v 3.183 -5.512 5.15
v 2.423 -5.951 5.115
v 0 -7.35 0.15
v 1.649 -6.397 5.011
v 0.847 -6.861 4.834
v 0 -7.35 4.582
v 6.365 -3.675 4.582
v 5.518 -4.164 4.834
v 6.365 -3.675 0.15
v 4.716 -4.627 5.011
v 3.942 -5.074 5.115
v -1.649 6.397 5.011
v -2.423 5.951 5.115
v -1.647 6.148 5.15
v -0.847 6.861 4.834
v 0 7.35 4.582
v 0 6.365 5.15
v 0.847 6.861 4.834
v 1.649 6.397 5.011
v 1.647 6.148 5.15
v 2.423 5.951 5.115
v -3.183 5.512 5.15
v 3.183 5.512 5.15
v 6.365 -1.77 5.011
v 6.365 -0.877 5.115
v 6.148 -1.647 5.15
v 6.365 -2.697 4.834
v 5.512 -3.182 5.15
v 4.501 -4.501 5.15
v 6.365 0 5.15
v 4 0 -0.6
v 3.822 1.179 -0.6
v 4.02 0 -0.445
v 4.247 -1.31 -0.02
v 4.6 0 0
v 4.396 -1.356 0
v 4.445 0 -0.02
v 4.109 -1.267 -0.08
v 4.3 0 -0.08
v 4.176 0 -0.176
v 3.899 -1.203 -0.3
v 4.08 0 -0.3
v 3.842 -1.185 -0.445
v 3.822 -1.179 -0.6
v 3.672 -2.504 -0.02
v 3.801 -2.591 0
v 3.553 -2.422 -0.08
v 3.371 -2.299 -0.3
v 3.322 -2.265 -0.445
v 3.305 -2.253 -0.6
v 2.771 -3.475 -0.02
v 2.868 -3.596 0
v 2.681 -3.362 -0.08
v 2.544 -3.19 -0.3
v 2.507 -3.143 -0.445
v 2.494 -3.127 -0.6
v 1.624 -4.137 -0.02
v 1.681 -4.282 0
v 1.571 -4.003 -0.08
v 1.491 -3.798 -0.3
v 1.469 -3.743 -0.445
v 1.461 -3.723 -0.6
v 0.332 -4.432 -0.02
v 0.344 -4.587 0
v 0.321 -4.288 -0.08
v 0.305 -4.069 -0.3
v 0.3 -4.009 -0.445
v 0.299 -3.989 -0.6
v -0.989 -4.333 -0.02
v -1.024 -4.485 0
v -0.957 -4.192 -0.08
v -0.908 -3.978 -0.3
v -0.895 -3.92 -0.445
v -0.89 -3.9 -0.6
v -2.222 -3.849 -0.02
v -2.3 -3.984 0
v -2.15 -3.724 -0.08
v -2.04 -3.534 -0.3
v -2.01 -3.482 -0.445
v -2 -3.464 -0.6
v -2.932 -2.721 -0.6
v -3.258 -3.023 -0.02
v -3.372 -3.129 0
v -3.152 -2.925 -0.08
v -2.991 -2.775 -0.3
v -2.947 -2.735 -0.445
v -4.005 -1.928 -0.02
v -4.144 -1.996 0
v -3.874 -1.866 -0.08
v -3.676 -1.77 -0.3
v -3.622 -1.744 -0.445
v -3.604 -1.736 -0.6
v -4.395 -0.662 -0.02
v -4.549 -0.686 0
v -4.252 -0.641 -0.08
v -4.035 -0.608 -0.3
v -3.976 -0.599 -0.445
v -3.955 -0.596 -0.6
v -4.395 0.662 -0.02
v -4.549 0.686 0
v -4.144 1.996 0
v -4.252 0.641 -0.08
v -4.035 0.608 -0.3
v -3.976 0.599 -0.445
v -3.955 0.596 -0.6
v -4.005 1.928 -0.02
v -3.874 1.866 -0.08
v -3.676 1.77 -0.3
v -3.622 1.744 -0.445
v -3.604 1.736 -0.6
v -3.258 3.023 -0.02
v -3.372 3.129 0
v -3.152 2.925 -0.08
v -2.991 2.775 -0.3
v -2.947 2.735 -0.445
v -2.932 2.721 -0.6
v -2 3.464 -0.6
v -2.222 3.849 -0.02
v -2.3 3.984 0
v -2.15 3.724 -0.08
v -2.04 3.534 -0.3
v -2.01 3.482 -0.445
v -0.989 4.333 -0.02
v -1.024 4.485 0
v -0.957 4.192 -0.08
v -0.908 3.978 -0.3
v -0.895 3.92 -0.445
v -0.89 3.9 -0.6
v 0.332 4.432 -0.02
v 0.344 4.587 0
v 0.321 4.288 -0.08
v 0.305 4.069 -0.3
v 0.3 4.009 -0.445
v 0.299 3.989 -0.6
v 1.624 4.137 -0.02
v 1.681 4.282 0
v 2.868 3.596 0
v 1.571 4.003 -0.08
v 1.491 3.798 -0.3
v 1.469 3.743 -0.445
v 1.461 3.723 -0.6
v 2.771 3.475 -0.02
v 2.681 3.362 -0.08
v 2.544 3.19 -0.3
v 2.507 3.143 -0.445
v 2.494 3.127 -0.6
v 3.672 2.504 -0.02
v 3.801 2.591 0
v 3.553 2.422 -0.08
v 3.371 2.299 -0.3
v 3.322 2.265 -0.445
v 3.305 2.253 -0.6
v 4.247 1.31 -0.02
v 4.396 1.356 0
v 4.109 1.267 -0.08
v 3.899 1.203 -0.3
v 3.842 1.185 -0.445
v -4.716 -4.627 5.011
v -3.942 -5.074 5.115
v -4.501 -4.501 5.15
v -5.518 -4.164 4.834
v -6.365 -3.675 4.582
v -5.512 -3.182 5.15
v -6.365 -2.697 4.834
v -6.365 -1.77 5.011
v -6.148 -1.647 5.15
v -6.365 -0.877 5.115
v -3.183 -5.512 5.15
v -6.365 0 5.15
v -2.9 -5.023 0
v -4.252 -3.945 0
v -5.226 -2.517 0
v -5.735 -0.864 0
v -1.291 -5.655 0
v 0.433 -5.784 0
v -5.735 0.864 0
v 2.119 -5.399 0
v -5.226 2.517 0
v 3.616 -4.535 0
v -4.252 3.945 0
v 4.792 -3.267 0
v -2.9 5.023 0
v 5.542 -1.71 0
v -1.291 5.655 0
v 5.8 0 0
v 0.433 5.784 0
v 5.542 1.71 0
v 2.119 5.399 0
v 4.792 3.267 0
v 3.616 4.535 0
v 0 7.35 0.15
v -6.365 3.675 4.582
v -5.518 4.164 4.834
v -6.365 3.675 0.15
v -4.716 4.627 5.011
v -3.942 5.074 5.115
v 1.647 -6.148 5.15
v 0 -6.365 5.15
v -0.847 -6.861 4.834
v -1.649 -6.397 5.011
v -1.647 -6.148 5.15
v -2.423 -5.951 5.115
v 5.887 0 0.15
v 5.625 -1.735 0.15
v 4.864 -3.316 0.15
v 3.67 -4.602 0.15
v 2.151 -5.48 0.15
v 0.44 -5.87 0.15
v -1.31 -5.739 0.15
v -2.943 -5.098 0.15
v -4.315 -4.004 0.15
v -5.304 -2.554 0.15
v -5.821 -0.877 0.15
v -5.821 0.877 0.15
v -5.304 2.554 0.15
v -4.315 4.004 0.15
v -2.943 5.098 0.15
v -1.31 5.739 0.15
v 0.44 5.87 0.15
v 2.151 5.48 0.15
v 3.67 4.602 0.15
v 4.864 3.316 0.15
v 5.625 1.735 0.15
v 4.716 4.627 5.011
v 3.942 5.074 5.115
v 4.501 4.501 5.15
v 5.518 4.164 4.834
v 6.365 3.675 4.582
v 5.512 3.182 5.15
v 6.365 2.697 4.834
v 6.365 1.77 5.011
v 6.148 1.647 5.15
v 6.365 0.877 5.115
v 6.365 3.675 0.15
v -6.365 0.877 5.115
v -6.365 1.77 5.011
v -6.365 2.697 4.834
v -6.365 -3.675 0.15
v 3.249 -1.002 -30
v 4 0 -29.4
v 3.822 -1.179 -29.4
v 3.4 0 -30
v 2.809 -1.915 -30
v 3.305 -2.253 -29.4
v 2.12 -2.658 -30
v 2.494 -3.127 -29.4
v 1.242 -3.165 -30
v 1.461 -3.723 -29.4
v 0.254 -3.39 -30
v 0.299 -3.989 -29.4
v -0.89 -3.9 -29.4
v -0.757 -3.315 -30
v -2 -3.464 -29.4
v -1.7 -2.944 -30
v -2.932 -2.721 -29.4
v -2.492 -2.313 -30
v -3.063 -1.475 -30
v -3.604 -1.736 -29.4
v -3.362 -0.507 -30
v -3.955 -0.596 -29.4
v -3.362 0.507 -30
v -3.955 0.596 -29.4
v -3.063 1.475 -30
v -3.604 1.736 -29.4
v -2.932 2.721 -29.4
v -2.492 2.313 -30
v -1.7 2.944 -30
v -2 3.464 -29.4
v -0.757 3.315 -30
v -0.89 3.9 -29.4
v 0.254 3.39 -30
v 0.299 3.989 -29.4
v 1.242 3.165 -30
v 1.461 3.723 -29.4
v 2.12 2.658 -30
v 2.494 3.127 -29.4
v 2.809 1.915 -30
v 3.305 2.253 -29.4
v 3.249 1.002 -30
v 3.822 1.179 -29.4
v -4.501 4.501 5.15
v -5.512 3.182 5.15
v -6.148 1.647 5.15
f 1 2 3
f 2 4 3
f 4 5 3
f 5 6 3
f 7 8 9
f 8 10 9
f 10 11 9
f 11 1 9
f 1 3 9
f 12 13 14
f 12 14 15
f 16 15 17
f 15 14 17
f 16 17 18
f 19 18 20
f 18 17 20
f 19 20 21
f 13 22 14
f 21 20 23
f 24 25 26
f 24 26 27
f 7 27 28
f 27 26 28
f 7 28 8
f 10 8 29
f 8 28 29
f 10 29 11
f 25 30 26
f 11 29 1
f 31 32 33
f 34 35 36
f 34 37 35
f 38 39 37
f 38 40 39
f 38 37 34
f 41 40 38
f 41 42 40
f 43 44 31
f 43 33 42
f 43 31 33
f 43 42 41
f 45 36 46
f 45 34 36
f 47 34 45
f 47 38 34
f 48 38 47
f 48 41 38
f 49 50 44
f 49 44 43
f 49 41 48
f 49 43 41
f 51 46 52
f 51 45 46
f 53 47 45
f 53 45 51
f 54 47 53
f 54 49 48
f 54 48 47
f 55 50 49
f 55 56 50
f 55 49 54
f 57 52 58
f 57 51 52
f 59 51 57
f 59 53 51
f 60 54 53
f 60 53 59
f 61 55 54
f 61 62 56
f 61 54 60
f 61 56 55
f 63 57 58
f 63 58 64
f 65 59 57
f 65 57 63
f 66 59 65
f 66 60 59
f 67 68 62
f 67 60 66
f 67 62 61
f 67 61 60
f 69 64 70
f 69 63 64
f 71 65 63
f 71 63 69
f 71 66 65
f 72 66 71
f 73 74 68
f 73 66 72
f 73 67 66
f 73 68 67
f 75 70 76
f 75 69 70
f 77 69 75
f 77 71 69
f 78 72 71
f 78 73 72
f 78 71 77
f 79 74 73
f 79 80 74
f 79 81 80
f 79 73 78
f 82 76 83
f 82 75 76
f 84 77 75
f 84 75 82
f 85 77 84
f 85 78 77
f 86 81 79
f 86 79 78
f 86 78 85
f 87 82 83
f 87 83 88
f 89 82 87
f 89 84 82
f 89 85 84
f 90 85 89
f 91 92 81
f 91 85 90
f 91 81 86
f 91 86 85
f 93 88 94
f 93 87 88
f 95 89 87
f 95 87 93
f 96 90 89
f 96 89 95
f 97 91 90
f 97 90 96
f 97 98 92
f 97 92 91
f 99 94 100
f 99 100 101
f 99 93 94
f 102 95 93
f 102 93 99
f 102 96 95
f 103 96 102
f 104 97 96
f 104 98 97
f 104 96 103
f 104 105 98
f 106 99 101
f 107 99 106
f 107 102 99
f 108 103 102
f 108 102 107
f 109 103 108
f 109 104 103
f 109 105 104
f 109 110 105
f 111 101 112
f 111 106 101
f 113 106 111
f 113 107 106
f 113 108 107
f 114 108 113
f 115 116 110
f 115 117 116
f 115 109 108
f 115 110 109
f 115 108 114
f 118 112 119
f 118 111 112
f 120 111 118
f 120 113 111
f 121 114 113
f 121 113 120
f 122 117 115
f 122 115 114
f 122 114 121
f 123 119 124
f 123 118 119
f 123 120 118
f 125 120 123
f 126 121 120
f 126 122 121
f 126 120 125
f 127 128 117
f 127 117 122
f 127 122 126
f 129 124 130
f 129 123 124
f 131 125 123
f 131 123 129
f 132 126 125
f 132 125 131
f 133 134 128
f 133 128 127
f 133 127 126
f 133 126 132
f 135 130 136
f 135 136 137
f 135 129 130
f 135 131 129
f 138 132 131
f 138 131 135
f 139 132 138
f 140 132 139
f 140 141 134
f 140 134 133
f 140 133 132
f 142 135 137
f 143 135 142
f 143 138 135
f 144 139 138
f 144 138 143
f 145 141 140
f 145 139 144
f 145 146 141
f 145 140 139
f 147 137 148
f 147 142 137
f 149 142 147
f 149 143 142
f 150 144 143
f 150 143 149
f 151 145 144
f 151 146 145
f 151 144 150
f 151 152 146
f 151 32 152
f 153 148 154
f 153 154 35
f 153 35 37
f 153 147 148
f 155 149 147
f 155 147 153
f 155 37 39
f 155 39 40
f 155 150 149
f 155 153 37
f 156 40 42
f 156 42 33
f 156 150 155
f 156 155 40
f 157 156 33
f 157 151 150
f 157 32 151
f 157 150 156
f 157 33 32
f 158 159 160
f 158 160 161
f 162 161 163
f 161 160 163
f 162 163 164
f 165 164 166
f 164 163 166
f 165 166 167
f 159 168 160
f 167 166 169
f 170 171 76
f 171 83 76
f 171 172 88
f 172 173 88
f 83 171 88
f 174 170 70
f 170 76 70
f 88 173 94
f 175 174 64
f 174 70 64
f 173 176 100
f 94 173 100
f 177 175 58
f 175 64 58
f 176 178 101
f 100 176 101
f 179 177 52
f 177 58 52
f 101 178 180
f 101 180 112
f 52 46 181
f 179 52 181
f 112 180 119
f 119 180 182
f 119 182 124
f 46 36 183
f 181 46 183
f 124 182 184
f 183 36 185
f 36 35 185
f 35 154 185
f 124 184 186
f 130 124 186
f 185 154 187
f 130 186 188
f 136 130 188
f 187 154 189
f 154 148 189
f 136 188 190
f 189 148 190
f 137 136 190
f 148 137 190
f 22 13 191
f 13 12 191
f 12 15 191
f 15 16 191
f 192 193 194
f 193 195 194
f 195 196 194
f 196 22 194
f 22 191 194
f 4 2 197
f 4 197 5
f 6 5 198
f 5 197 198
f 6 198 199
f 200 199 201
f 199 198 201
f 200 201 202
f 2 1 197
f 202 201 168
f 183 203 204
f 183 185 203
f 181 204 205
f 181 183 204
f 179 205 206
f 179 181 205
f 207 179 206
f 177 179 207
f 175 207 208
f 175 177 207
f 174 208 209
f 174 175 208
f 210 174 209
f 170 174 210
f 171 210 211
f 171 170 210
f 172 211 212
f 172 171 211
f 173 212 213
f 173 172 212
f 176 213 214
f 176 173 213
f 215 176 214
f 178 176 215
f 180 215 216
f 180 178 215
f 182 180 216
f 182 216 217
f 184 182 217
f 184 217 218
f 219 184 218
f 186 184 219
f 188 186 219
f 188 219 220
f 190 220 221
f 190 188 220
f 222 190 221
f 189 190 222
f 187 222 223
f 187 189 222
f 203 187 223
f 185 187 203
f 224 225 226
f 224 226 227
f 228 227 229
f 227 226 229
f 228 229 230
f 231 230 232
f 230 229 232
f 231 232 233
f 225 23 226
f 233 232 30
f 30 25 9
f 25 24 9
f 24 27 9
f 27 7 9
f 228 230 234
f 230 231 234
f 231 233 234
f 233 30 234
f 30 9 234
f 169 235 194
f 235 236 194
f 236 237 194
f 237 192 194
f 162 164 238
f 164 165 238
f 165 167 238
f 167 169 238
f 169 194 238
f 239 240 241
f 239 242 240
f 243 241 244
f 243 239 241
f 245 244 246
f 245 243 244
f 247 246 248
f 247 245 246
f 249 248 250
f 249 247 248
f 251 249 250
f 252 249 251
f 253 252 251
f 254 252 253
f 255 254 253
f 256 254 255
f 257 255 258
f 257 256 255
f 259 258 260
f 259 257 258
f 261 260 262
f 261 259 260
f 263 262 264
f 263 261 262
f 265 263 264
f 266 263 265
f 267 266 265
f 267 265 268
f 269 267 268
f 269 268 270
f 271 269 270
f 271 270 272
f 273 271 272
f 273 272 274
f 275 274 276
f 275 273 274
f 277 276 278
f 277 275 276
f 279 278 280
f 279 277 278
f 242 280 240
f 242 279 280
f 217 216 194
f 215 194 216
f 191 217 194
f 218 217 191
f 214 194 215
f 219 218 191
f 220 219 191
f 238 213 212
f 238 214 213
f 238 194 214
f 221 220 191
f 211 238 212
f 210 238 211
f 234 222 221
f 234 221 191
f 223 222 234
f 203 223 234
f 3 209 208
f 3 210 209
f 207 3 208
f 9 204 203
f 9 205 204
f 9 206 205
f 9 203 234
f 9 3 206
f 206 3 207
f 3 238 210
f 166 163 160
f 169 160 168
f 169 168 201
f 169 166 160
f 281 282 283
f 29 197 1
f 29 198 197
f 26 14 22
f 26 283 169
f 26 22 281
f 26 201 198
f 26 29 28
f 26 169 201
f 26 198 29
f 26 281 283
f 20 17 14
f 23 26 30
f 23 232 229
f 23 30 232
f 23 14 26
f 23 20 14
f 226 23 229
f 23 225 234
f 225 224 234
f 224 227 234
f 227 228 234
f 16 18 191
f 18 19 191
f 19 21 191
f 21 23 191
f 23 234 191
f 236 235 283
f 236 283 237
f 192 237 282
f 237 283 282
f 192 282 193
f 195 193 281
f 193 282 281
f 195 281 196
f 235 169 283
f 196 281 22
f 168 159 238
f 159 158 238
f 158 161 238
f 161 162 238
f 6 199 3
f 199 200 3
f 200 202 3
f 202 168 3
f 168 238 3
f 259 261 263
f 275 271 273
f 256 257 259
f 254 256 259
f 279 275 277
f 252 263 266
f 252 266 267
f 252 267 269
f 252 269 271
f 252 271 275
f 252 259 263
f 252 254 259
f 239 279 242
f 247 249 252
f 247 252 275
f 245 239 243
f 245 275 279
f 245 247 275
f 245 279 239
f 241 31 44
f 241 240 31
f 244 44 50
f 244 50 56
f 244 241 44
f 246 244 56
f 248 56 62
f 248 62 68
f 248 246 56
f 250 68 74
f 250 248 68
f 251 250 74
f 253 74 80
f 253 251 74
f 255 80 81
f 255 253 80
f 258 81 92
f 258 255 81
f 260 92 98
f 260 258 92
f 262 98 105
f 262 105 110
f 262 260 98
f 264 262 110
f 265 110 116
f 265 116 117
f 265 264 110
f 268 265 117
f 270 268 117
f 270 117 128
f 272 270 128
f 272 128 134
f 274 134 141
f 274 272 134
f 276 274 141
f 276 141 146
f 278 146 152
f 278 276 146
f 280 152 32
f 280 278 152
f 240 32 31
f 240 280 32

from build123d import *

# Parameters (mm, degrees)
BOSS_EXTRUDE1_DEPTH = 5.15


with BuildPart() as part:
    # Sketch1 → Boss-Extrude1 (new body)
    with BuildSketch(Plane.XY):
        Polygon((0, 7.349668927), (-6.365, 3.674834463), (-6.365, -3.674834463), (0, -7.349668927), (6.365, -3.674834463), (6.365, 3.674834463), align=None)
    extrude(amount=BOSS_EXTRUDE1_DEPTH)

    # Sketch2 → Revolve1 (revolve)
    with BuildSketch(Plane(origin=(0, 0, 0), x_dir=(0, 0, -1), z_dir=(1, 0, 0)), mode=Mode.PRIVATE) as revolve1_sk:
        with BuildLine():
            Line((0, 0), (0, 4.6))
            ThreePointArc((0, 4.6), (0.175735931, 4.175735931), (0.6, 4))
            Line((0.6, 4), (29.4, 4))
            Line((29.4, 4), (30, 3.4))
            Line((30, 3.4), (30, 0))
            Line((30, 0), (0, 0))
        make_face()
    revolve(revolve1_sk.sketch.rotate(Axis((0, 0, 0), (0, 0, -1)), 90), axis=Axis((0, 0, 0), (0, 0, -1)))

    # Sketch3 → Cut-Revolve1 (revolve, cut)
    with BuildSketch(Plane(origin=(0, 0, 0), x_dir=(0, 0, -1), z_dir=(1, 0, 0)), mode=Mode.PRIVATE) as cut_revolve1_sk:
        Polygon((-5.15, 7.349668927), (-4.58150113, 7.349668927), (-5.15, 6.365), align=None)
        Polygon((-0.15, 7.349668927), (-0.15, 5.88660254), (0, 5.8), (0, 7.349668927), align=None)
    revolve(cut_revolve1_sk.sketch.rotate(Axis((0, 0, 12.204941078), (0, 0, -1)), 90), axis=Axis((0, 0, 12.204941078), (0, 0, -1)), mode=Mode.SUBTRACT)


solid = part.part
